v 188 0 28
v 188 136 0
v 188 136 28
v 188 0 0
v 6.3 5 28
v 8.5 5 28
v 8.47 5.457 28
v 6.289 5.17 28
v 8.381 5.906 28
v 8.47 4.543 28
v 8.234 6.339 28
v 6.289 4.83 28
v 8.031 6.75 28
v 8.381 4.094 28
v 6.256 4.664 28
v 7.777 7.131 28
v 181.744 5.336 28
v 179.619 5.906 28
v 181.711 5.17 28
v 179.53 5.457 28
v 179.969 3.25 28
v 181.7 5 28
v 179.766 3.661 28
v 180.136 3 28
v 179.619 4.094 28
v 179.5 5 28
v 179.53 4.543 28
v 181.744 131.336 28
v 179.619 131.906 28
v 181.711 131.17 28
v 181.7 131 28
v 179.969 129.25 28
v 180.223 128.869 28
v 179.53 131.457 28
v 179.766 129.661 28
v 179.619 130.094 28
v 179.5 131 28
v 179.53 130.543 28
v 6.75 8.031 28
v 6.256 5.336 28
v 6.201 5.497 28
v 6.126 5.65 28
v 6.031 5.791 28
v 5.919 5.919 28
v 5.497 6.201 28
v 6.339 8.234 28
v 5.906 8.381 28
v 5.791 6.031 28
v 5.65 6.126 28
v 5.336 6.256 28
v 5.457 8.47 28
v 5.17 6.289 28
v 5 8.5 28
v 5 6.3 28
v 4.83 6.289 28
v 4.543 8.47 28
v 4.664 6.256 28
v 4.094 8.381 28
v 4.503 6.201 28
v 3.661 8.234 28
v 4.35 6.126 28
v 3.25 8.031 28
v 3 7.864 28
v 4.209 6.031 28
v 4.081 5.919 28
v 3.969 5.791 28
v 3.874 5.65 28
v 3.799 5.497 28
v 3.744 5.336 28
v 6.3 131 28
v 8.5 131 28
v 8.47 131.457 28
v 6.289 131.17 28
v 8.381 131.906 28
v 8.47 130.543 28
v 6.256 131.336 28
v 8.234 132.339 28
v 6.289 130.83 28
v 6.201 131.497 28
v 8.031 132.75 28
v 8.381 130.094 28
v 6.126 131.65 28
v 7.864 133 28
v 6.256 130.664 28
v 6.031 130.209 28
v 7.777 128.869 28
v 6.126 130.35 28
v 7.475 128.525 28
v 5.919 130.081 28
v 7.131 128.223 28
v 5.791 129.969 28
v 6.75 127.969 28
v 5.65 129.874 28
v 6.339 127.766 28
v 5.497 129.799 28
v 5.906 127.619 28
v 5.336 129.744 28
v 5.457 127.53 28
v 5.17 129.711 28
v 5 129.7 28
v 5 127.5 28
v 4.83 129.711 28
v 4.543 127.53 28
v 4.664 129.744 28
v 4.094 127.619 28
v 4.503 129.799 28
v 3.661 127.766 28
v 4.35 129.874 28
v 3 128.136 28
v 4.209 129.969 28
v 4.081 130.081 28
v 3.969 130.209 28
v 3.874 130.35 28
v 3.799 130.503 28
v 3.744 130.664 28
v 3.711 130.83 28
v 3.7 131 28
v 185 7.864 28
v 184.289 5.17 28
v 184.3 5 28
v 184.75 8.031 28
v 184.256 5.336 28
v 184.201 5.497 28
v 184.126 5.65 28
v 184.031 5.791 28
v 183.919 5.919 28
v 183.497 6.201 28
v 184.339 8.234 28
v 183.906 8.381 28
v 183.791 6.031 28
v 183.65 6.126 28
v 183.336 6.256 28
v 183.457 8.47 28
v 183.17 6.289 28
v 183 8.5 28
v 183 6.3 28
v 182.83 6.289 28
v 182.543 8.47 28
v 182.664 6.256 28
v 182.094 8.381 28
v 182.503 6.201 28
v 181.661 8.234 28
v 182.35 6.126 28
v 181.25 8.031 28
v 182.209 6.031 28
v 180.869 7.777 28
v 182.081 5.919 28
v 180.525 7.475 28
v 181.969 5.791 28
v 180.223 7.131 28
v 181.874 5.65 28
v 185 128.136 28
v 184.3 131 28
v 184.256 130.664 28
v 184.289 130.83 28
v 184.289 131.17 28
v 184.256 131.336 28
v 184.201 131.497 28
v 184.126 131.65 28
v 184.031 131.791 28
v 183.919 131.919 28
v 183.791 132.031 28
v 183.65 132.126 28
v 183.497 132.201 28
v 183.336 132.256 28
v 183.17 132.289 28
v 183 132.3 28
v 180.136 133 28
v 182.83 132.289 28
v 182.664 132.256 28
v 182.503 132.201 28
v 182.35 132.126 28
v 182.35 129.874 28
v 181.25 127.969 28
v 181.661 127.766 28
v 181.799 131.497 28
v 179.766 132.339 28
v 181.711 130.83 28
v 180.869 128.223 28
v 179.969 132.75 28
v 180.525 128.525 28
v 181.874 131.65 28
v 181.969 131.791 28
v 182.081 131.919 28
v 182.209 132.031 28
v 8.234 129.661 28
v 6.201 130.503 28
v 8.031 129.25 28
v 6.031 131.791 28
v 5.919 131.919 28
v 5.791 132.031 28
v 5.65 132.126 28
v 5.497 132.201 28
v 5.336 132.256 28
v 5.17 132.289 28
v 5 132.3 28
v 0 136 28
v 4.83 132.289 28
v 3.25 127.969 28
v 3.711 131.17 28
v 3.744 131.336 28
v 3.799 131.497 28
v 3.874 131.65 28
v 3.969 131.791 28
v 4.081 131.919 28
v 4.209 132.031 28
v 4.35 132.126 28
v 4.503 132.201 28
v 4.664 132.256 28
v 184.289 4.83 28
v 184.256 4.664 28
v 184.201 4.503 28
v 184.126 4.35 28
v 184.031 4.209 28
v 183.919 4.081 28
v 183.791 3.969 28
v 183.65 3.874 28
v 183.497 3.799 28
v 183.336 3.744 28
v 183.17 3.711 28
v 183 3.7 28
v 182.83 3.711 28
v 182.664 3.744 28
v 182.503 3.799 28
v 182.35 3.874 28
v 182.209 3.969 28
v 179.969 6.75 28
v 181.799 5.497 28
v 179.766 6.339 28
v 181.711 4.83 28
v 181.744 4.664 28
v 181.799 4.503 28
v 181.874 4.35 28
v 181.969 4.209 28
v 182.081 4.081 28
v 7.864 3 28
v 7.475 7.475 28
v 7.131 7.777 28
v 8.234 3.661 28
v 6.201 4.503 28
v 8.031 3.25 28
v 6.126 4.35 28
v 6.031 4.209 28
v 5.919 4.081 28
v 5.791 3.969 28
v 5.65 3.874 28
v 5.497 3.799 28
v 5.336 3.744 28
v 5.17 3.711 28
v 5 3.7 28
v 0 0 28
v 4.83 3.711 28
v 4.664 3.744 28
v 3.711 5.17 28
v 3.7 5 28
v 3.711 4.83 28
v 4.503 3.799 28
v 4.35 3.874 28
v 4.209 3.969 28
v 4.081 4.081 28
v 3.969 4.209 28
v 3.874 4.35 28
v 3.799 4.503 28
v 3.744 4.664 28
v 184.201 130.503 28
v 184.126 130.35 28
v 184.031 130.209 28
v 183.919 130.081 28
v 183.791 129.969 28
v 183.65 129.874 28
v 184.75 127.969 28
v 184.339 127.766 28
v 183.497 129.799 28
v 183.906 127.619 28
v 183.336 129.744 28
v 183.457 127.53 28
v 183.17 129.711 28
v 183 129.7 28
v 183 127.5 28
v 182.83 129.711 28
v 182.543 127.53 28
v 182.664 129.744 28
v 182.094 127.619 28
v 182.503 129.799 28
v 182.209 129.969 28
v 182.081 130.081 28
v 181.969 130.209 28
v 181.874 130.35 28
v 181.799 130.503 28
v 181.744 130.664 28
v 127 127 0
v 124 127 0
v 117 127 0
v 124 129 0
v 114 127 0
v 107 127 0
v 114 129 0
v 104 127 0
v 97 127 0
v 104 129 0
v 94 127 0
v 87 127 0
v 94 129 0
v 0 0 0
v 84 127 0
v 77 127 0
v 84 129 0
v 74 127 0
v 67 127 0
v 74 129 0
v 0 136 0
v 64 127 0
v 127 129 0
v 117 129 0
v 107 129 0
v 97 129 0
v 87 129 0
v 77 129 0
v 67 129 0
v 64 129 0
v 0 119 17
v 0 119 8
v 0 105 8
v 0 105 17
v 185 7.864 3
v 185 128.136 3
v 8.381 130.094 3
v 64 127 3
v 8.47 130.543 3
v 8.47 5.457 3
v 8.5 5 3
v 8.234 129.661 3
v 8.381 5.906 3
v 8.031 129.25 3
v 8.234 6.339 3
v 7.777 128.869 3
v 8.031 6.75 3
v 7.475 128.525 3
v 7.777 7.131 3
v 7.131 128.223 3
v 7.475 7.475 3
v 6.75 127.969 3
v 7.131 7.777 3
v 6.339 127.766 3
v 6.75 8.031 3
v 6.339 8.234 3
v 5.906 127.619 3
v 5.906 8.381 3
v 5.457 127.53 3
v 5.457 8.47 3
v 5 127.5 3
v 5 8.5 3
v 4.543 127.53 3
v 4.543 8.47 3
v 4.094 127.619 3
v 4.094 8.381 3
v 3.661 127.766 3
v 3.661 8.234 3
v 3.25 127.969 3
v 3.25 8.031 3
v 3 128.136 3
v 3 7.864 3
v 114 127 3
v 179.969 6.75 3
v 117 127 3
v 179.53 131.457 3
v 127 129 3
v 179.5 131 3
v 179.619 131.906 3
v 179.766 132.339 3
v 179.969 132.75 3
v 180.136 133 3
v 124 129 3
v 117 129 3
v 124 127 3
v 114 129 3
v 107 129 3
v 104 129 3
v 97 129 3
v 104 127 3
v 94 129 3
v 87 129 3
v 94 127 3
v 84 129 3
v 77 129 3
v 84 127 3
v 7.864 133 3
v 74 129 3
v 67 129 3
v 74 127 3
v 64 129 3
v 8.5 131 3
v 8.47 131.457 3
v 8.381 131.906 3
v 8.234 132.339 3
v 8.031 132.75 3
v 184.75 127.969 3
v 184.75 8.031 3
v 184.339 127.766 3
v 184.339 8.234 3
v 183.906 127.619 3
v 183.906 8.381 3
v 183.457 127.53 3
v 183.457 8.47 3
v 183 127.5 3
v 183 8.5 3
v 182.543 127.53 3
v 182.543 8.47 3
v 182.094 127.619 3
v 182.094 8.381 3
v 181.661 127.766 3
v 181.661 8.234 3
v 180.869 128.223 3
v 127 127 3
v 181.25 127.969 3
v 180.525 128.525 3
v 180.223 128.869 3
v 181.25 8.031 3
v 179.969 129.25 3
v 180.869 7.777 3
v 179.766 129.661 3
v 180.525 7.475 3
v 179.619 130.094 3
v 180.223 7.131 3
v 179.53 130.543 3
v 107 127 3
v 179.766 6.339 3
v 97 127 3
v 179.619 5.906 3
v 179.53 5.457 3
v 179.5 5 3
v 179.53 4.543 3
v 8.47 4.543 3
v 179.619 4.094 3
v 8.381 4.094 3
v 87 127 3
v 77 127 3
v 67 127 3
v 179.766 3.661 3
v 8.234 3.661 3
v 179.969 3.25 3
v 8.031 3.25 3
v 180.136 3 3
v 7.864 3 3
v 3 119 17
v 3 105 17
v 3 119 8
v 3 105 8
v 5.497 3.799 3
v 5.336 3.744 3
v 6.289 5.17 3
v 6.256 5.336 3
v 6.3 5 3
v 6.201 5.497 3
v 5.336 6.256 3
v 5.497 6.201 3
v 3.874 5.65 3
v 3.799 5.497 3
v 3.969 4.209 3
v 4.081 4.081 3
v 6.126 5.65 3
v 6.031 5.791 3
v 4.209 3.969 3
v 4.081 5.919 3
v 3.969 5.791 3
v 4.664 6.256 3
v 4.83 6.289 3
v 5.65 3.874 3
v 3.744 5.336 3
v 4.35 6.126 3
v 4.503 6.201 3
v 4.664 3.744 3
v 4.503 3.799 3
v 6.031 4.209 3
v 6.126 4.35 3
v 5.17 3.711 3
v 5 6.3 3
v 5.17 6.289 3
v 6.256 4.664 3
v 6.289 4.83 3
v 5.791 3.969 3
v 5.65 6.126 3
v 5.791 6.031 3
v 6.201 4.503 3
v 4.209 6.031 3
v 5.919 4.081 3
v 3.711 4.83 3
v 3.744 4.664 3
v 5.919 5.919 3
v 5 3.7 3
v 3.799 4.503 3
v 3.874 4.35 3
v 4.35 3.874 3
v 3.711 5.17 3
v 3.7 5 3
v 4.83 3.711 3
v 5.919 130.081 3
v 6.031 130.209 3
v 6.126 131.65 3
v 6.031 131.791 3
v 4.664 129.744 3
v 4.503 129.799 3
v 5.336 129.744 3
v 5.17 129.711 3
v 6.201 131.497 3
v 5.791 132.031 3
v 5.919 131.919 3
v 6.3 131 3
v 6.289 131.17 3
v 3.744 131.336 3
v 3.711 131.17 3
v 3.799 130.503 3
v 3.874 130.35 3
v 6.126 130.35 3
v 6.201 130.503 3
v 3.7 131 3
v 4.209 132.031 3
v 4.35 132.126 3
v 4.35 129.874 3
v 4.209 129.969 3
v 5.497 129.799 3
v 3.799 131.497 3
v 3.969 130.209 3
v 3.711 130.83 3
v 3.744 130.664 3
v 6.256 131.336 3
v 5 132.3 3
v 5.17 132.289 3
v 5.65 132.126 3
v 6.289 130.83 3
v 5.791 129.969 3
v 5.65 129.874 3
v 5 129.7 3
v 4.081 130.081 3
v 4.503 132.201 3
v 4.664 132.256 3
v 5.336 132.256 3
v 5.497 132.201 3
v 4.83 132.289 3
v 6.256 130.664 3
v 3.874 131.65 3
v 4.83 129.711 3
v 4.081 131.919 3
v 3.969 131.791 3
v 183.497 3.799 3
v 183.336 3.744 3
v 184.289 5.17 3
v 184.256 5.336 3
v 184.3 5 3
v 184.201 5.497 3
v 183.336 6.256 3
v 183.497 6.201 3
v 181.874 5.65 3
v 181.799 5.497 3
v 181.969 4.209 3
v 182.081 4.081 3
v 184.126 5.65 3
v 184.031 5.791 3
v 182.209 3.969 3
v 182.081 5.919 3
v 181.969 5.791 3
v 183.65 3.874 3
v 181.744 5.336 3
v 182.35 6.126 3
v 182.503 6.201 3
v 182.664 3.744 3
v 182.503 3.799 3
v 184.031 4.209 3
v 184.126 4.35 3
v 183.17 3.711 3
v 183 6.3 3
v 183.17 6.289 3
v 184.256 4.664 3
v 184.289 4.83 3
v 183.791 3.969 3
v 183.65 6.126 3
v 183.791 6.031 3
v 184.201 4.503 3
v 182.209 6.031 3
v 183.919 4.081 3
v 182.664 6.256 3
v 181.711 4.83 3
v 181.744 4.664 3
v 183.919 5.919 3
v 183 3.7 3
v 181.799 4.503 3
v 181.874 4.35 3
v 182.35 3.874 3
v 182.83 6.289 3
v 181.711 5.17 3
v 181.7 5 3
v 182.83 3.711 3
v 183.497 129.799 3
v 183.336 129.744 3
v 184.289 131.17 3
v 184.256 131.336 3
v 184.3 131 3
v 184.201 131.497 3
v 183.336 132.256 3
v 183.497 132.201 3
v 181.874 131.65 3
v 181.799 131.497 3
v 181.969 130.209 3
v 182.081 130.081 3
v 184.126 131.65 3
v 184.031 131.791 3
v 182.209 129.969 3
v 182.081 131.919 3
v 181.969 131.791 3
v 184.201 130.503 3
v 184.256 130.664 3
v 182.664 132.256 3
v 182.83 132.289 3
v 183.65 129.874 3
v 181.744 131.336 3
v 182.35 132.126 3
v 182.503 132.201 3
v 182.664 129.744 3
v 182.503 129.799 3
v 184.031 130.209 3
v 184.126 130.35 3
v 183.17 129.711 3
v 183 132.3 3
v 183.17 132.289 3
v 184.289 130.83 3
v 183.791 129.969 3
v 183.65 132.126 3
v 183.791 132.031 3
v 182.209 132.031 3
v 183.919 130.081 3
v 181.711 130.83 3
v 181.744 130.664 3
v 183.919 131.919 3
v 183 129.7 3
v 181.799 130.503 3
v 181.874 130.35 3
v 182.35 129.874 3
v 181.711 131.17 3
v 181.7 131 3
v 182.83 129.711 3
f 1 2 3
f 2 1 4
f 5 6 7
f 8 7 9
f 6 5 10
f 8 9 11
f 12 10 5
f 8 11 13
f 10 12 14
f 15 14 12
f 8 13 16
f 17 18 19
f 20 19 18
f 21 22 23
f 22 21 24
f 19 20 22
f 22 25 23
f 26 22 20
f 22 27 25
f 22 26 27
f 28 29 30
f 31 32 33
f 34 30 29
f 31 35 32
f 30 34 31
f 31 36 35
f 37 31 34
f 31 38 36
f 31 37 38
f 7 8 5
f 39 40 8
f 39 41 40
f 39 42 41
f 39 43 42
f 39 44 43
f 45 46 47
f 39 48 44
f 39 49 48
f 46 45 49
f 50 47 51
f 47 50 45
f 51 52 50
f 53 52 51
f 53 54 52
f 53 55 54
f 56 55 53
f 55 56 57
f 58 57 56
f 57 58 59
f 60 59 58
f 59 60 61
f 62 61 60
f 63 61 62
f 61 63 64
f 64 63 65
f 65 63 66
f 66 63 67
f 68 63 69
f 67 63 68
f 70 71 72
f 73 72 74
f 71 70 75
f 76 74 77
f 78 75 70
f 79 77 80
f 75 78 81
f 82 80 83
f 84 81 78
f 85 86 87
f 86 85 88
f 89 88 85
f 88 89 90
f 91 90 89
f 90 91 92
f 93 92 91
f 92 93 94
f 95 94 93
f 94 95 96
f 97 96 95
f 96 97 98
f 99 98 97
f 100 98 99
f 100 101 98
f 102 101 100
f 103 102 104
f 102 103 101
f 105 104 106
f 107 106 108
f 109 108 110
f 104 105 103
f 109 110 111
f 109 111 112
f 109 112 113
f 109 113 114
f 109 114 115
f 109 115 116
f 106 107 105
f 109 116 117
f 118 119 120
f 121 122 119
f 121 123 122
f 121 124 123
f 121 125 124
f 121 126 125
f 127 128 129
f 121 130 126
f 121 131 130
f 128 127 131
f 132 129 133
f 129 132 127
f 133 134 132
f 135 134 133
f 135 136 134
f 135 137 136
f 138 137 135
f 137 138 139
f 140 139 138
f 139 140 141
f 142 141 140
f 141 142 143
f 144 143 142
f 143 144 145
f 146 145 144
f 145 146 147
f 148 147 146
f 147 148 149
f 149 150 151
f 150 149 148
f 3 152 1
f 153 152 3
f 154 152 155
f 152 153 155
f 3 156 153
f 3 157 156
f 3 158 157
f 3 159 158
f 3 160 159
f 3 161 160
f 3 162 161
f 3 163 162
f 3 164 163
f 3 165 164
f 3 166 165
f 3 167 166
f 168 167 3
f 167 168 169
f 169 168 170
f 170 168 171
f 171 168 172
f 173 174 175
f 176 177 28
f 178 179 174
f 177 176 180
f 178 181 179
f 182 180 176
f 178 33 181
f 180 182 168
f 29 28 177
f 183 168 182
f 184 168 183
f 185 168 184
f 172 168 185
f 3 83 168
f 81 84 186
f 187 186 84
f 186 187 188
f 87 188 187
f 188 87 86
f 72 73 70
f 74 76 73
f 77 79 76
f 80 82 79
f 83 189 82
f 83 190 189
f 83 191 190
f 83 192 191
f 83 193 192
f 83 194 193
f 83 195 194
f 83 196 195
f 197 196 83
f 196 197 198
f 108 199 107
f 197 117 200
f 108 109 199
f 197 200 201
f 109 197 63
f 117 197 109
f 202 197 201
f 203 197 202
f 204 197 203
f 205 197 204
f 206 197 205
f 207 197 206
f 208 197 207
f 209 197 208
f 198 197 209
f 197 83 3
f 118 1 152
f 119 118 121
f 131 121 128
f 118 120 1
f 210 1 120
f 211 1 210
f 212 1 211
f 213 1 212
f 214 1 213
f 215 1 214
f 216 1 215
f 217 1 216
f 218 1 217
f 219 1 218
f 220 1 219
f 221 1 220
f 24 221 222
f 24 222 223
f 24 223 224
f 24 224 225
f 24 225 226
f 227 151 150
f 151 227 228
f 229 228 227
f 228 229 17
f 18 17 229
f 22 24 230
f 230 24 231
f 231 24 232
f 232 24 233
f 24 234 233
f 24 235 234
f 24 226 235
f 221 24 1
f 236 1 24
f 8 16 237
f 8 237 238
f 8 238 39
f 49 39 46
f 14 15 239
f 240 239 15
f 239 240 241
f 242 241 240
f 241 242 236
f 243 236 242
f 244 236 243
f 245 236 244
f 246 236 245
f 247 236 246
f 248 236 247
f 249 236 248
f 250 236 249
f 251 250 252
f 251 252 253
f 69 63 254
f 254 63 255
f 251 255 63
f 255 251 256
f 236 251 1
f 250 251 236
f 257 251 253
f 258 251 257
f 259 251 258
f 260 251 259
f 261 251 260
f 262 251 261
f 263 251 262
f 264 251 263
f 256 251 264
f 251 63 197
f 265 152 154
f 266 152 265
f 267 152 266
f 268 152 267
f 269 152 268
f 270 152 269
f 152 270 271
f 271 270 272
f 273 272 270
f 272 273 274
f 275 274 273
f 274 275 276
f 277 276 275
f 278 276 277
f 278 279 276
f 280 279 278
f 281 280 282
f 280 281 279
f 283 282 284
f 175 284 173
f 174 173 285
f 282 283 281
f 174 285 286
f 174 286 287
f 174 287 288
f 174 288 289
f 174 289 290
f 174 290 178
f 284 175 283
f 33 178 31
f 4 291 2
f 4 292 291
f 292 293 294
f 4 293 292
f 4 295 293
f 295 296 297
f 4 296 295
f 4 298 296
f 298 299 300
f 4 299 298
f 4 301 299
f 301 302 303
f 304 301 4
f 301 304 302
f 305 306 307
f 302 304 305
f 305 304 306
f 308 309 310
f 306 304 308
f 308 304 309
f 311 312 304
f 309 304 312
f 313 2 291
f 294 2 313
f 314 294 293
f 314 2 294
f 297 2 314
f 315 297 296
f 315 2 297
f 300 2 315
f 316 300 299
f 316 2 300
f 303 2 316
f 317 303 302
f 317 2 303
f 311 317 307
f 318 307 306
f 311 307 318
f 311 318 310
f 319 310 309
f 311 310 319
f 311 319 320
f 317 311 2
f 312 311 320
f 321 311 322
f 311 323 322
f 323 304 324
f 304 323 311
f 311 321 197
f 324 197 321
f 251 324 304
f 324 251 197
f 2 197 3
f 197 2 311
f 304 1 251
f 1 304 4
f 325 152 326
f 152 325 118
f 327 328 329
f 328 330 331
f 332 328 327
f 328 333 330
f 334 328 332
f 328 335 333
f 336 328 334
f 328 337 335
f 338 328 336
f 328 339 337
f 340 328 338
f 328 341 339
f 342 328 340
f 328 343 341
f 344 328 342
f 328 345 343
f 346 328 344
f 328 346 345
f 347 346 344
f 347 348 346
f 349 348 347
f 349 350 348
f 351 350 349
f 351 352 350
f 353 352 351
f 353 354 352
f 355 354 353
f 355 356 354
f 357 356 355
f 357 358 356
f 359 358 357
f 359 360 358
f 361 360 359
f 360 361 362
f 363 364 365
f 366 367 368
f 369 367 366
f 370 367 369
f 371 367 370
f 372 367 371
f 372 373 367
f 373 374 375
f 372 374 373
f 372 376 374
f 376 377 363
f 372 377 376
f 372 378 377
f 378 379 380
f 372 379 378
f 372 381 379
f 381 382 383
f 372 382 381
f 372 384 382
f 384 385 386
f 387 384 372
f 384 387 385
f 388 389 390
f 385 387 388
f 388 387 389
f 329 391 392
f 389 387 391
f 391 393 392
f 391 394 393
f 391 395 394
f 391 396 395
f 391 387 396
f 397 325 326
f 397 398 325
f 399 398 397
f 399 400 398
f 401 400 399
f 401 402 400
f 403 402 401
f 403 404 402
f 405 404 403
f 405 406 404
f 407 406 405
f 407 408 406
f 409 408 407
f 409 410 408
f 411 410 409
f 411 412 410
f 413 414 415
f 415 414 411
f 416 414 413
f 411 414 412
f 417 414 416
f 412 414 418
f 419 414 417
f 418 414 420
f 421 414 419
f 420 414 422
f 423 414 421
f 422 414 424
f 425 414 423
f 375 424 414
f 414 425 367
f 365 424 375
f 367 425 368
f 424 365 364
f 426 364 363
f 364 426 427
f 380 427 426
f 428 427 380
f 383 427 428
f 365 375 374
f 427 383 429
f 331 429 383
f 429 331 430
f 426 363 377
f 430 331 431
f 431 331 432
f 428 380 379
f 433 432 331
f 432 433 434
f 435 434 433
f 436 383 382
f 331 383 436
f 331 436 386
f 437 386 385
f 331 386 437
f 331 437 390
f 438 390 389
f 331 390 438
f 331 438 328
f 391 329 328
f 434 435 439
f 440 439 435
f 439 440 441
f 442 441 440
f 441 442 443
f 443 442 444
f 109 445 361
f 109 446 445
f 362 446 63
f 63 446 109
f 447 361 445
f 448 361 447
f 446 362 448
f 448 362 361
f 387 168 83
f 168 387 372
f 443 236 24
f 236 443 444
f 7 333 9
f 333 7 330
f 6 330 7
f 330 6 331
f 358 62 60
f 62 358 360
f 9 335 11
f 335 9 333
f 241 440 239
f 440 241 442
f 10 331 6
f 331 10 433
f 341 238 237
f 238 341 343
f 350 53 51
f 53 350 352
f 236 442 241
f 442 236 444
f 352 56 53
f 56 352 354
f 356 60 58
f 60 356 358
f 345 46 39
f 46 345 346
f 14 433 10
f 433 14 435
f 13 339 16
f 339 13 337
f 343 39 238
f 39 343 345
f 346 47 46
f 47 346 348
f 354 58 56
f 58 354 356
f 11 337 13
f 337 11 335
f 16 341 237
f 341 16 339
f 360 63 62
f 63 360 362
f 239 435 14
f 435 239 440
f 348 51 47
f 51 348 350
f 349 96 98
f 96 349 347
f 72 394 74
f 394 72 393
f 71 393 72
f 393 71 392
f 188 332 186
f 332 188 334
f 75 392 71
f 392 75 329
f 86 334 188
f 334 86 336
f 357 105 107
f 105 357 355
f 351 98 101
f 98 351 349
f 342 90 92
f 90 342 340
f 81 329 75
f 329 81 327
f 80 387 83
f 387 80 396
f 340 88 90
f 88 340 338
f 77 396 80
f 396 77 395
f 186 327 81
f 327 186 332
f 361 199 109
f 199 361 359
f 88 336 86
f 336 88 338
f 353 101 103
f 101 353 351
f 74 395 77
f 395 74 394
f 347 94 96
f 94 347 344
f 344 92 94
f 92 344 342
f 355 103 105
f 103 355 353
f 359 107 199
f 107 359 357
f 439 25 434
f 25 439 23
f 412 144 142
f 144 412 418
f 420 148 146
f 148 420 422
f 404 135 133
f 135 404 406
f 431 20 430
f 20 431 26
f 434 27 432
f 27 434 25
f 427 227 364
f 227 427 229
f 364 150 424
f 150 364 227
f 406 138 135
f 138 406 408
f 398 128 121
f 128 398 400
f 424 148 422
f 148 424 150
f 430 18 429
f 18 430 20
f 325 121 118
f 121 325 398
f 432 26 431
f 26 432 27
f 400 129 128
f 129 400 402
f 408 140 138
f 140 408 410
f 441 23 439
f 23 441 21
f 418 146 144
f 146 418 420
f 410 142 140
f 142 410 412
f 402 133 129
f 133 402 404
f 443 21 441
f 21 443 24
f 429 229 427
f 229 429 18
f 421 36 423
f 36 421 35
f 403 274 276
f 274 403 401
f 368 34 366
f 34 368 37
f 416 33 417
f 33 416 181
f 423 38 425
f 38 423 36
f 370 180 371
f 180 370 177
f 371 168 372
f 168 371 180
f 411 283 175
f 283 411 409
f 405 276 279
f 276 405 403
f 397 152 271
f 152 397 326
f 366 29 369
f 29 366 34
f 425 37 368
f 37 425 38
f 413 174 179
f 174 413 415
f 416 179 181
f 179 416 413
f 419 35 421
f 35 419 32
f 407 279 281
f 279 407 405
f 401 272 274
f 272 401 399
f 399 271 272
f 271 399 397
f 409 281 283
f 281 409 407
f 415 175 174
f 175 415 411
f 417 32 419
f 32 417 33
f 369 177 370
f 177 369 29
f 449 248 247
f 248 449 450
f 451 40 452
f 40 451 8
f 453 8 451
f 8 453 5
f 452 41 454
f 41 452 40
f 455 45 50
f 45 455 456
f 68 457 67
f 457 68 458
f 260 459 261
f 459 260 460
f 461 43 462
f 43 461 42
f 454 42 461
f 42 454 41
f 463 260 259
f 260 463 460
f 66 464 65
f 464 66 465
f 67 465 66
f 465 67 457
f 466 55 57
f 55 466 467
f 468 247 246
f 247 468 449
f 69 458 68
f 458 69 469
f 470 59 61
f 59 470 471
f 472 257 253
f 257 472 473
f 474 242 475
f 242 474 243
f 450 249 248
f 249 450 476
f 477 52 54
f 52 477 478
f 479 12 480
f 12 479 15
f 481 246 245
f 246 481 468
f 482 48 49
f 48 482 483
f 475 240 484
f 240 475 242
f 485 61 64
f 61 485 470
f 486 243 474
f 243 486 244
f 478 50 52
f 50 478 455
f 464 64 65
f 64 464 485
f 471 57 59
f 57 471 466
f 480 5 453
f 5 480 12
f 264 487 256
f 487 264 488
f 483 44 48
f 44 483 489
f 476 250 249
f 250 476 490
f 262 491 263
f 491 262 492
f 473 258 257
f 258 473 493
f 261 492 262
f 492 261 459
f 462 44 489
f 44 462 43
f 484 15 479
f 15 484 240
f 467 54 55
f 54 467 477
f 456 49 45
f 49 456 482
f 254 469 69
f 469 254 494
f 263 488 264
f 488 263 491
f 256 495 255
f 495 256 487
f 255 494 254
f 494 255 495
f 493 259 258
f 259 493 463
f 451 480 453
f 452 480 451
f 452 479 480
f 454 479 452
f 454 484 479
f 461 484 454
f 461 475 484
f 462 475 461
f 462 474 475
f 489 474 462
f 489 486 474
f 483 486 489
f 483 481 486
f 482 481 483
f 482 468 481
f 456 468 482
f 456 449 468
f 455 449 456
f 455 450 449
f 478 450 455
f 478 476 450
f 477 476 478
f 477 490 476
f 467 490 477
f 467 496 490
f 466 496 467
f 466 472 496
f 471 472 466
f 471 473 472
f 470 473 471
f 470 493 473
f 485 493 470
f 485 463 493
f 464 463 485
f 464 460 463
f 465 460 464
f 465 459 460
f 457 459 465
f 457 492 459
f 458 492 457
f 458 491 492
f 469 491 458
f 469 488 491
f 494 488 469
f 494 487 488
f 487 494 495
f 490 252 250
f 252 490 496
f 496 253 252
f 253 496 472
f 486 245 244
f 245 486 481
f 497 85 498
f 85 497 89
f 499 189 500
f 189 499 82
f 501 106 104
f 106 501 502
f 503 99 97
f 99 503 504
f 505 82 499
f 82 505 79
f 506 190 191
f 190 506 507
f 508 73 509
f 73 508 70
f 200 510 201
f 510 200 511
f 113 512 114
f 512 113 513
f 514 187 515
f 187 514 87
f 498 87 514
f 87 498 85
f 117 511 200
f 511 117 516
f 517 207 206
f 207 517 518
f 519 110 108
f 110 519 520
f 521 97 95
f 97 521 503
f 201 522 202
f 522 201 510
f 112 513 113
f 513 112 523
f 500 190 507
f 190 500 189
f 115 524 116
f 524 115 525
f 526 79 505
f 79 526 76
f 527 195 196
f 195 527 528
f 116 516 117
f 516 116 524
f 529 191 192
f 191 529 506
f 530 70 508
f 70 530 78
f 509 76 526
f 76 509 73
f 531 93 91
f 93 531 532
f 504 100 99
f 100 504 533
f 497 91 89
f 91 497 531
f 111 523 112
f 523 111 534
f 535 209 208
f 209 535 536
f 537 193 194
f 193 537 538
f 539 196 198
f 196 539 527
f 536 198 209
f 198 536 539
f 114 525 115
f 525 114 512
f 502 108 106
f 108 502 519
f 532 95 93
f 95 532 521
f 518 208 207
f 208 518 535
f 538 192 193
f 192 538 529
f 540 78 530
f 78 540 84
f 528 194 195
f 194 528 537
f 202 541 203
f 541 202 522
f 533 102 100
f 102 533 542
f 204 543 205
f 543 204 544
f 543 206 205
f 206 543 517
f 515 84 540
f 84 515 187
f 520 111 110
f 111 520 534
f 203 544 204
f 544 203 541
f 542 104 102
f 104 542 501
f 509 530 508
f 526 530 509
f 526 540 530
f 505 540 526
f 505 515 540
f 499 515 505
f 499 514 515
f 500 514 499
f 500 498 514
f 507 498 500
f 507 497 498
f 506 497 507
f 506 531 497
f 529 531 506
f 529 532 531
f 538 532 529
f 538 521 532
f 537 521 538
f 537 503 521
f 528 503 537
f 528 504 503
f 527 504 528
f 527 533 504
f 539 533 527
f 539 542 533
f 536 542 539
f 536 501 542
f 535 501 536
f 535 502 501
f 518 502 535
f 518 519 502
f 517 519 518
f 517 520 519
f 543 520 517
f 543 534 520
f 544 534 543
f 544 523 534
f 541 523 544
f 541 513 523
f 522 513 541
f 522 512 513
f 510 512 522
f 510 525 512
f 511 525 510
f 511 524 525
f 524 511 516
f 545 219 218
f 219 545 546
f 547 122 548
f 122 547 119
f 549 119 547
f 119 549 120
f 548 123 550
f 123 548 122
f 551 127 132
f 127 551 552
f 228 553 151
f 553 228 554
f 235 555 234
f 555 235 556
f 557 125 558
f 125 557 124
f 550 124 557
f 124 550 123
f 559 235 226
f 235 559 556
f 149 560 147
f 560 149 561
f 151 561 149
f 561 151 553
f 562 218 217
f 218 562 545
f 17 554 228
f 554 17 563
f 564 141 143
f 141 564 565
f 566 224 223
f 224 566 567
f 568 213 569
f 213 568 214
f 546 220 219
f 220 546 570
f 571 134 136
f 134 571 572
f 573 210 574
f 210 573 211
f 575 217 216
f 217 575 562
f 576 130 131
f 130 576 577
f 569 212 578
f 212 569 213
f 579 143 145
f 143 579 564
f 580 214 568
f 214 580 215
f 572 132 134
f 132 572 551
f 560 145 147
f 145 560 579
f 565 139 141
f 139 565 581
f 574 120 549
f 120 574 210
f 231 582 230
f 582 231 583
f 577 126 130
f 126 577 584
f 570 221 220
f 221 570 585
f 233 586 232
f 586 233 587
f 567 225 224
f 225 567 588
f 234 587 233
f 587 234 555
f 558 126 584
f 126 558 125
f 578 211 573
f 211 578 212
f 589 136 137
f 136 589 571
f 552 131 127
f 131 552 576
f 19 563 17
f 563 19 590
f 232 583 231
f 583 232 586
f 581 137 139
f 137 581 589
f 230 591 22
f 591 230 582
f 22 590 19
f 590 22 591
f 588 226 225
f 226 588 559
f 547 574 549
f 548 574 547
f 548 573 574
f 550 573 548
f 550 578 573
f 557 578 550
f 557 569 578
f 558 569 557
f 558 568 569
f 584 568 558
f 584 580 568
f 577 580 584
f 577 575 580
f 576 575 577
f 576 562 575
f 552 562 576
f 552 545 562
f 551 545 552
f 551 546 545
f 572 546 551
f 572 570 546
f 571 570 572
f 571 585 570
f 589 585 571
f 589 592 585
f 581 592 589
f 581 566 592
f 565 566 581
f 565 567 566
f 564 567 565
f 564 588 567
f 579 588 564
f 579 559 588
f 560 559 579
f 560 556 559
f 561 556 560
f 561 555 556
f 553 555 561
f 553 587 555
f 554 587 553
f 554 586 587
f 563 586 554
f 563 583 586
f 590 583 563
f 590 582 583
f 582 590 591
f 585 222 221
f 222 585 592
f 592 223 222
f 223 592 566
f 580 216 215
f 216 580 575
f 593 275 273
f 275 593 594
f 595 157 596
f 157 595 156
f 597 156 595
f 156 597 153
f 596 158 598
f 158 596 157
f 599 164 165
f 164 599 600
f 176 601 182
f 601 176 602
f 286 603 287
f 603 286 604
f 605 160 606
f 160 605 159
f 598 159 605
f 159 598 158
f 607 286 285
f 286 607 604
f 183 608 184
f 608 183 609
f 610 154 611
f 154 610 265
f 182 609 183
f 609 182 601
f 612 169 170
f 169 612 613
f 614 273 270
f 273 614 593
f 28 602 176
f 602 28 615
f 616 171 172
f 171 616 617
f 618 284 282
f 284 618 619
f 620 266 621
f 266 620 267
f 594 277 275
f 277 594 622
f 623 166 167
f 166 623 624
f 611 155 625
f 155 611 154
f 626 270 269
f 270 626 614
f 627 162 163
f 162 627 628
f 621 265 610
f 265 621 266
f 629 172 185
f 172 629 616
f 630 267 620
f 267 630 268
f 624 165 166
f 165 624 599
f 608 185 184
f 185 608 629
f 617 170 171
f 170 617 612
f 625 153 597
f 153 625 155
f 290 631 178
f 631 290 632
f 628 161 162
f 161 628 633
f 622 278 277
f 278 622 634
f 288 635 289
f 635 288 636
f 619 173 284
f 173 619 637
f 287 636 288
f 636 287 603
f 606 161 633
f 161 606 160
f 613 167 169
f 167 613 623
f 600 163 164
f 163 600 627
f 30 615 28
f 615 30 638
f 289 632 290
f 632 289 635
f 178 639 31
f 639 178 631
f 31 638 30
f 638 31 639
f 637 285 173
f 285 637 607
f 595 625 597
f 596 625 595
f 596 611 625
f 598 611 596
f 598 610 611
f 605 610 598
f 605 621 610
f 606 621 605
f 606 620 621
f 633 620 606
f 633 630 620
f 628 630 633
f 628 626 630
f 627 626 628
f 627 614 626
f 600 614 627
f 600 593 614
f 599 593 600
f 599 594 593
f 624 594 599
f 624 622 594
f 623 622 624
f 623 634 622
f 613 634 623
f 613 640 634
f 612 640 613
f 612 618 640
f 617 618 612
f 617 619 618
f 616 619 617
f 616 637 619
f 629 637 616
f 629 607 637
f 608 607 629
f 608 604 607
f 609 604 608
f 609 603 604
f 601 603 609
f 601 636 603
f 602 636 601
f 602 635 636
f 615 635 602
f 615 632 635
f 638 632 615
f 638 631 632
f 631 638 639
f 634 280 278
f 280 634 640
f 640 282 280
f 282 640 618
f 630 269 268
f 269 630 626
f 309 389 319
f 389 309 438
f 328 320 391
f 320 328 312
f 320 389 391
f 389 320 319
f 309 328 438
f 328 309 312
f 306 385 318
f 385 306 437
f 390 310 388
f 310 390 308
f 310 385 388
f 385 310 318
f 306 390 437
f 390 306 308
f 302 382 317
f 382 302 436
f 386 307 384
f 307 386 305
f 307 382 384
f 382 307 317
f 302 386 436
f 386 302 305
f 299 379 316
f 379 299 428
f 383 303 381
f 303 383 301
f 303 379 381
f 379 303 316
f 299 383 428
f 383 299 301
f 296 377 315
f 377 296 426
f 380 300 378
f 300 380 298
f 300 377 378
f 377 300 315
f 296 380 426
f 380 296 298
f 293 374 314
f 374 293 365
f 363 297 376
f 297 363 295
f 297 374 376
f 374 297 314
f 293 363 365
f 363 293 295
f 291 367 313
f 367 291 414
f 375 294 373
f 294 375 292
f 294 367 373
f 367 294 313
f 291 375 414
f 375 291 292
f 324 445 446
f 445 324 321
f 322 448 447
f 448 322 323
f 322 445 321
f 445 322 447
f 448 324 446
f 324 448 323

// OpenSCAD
// Singapore MRT: TWO INDEPENDENT DISPLAY ITEMS. Units are millimetres.
// LED carrier: laser-cut 420x298x3 mm front/back, separated by 34 mm.
// E-paper: independent 188x136 mm shell; never fitted into the LED front.
// Render one selected part with: openscad -D 'part="pixel_cup"' -o part.stl enclosures.scad
$fn=48;
part="epaper_shell";

module spacer(height=34, diameter=10, bore=3.3) {
    difference() {
        cylinder(h=height,d=diameter);
        translate([0,0,-.1]) cylinder(h=height+.2,d=bore);
    }
}

module pixel_cup() {
    // LED shines down through the opening at z=0. Tape the flat bottom to the
    // front panel rear, aligned with its 5.5 mm aperture. Insert module from +Z.
    difference() {
        translate([-6.3,-6.3,0]) cube([12.6,12.6,5.5]);
        translate([-5.1,-5.1,1.2]) cube([10.2,10.2,4.4]);
        translate([0,0,-.1]) cylinder(h=1.4,d=5.7);
        // Cable exit at rear edge; do not clamp wire against the PCB.
        translate([4.9,-2,3]) cube([1.5,4,2.6]);
    }
}

module led_parts() {
    for(i=[0:5]) translate([i*14,0,0]) spacer();
    for(i=[0:15]) translate([(i%8)*16,24+floor(i/8)*16,0]) pixel_cup();
}

module epaper_shell() {
    // Screen glass sits directly behind a SEPARATE 3mm laser front bezel.
    // Support its perimeter with foam tape; no pressure on active glass.
    // Shell interior 182x130, intentionally loose to allow alignment by eye
    // to the 164.2x99mm aperture and strain relief for the FPC cable.
    difference() {
        union() {
            difference() {
                cube([188,136,28]);
                translate([3,3,3]) cube([182,130,26]);
            }
            for(x=[5,183],y=[5,131]) translate([x,y,3]) cylinder(h=25,d=7);
        }
        for(x=[5,183],y=[5,131]) translate([x,y,3]) cylinder(h=25.2,d=2.6);
        // Cable opening in side. This is a clearance opening for a USB cable,
        // not a fitted connector: measured DevKit connector positions vary.
        translate([-1,105,8]) cube([5,14,9]);
        for(x=[64:10:124]) translate([x,127,-.1]) cube([3,2,3.2]);
    }
}

module epaper_front() {
    difference() {
        cube([188,136,3]);
        translate([11.9,18.5,-.1]) cube([164.2,99,3.2]);
        for(x=[5,183],y=[5,131]) translate([x,y,-.1]) cylinder(h=3.2,d=3.3);
    }
}

module epaper_blank_mount() {
    // Universal electronics mounting plate; adhesive/Velcro holds a DevKit
    // and the matching e-paper driver board without guessed PCB hole patterns.
    difference() {
        cube([90,48,2]);
        for(x=[10,80]) translate([x,24,-.1]) cylinder(h=2.2,d=3.3);
        for(x=[20,30,60,70]) translate([x,3,-.1]) cube([3,42,2.2]);
    }
}

if(part=="pixel_cup") pixel_cup();
else if(part=="panel_spacer") spacer();
else if(part=="pcb_spacer") spacer(12,7,3.3);
else if(part=="led_parts") led_parts();
else if(part=="epaper_shell") epaper_shell();
else if(part=="epaper_front") epaper_front();
else if(part=="epaper_mount") epaper_blank_mount();
else assert(false,"Unknown part selection");
